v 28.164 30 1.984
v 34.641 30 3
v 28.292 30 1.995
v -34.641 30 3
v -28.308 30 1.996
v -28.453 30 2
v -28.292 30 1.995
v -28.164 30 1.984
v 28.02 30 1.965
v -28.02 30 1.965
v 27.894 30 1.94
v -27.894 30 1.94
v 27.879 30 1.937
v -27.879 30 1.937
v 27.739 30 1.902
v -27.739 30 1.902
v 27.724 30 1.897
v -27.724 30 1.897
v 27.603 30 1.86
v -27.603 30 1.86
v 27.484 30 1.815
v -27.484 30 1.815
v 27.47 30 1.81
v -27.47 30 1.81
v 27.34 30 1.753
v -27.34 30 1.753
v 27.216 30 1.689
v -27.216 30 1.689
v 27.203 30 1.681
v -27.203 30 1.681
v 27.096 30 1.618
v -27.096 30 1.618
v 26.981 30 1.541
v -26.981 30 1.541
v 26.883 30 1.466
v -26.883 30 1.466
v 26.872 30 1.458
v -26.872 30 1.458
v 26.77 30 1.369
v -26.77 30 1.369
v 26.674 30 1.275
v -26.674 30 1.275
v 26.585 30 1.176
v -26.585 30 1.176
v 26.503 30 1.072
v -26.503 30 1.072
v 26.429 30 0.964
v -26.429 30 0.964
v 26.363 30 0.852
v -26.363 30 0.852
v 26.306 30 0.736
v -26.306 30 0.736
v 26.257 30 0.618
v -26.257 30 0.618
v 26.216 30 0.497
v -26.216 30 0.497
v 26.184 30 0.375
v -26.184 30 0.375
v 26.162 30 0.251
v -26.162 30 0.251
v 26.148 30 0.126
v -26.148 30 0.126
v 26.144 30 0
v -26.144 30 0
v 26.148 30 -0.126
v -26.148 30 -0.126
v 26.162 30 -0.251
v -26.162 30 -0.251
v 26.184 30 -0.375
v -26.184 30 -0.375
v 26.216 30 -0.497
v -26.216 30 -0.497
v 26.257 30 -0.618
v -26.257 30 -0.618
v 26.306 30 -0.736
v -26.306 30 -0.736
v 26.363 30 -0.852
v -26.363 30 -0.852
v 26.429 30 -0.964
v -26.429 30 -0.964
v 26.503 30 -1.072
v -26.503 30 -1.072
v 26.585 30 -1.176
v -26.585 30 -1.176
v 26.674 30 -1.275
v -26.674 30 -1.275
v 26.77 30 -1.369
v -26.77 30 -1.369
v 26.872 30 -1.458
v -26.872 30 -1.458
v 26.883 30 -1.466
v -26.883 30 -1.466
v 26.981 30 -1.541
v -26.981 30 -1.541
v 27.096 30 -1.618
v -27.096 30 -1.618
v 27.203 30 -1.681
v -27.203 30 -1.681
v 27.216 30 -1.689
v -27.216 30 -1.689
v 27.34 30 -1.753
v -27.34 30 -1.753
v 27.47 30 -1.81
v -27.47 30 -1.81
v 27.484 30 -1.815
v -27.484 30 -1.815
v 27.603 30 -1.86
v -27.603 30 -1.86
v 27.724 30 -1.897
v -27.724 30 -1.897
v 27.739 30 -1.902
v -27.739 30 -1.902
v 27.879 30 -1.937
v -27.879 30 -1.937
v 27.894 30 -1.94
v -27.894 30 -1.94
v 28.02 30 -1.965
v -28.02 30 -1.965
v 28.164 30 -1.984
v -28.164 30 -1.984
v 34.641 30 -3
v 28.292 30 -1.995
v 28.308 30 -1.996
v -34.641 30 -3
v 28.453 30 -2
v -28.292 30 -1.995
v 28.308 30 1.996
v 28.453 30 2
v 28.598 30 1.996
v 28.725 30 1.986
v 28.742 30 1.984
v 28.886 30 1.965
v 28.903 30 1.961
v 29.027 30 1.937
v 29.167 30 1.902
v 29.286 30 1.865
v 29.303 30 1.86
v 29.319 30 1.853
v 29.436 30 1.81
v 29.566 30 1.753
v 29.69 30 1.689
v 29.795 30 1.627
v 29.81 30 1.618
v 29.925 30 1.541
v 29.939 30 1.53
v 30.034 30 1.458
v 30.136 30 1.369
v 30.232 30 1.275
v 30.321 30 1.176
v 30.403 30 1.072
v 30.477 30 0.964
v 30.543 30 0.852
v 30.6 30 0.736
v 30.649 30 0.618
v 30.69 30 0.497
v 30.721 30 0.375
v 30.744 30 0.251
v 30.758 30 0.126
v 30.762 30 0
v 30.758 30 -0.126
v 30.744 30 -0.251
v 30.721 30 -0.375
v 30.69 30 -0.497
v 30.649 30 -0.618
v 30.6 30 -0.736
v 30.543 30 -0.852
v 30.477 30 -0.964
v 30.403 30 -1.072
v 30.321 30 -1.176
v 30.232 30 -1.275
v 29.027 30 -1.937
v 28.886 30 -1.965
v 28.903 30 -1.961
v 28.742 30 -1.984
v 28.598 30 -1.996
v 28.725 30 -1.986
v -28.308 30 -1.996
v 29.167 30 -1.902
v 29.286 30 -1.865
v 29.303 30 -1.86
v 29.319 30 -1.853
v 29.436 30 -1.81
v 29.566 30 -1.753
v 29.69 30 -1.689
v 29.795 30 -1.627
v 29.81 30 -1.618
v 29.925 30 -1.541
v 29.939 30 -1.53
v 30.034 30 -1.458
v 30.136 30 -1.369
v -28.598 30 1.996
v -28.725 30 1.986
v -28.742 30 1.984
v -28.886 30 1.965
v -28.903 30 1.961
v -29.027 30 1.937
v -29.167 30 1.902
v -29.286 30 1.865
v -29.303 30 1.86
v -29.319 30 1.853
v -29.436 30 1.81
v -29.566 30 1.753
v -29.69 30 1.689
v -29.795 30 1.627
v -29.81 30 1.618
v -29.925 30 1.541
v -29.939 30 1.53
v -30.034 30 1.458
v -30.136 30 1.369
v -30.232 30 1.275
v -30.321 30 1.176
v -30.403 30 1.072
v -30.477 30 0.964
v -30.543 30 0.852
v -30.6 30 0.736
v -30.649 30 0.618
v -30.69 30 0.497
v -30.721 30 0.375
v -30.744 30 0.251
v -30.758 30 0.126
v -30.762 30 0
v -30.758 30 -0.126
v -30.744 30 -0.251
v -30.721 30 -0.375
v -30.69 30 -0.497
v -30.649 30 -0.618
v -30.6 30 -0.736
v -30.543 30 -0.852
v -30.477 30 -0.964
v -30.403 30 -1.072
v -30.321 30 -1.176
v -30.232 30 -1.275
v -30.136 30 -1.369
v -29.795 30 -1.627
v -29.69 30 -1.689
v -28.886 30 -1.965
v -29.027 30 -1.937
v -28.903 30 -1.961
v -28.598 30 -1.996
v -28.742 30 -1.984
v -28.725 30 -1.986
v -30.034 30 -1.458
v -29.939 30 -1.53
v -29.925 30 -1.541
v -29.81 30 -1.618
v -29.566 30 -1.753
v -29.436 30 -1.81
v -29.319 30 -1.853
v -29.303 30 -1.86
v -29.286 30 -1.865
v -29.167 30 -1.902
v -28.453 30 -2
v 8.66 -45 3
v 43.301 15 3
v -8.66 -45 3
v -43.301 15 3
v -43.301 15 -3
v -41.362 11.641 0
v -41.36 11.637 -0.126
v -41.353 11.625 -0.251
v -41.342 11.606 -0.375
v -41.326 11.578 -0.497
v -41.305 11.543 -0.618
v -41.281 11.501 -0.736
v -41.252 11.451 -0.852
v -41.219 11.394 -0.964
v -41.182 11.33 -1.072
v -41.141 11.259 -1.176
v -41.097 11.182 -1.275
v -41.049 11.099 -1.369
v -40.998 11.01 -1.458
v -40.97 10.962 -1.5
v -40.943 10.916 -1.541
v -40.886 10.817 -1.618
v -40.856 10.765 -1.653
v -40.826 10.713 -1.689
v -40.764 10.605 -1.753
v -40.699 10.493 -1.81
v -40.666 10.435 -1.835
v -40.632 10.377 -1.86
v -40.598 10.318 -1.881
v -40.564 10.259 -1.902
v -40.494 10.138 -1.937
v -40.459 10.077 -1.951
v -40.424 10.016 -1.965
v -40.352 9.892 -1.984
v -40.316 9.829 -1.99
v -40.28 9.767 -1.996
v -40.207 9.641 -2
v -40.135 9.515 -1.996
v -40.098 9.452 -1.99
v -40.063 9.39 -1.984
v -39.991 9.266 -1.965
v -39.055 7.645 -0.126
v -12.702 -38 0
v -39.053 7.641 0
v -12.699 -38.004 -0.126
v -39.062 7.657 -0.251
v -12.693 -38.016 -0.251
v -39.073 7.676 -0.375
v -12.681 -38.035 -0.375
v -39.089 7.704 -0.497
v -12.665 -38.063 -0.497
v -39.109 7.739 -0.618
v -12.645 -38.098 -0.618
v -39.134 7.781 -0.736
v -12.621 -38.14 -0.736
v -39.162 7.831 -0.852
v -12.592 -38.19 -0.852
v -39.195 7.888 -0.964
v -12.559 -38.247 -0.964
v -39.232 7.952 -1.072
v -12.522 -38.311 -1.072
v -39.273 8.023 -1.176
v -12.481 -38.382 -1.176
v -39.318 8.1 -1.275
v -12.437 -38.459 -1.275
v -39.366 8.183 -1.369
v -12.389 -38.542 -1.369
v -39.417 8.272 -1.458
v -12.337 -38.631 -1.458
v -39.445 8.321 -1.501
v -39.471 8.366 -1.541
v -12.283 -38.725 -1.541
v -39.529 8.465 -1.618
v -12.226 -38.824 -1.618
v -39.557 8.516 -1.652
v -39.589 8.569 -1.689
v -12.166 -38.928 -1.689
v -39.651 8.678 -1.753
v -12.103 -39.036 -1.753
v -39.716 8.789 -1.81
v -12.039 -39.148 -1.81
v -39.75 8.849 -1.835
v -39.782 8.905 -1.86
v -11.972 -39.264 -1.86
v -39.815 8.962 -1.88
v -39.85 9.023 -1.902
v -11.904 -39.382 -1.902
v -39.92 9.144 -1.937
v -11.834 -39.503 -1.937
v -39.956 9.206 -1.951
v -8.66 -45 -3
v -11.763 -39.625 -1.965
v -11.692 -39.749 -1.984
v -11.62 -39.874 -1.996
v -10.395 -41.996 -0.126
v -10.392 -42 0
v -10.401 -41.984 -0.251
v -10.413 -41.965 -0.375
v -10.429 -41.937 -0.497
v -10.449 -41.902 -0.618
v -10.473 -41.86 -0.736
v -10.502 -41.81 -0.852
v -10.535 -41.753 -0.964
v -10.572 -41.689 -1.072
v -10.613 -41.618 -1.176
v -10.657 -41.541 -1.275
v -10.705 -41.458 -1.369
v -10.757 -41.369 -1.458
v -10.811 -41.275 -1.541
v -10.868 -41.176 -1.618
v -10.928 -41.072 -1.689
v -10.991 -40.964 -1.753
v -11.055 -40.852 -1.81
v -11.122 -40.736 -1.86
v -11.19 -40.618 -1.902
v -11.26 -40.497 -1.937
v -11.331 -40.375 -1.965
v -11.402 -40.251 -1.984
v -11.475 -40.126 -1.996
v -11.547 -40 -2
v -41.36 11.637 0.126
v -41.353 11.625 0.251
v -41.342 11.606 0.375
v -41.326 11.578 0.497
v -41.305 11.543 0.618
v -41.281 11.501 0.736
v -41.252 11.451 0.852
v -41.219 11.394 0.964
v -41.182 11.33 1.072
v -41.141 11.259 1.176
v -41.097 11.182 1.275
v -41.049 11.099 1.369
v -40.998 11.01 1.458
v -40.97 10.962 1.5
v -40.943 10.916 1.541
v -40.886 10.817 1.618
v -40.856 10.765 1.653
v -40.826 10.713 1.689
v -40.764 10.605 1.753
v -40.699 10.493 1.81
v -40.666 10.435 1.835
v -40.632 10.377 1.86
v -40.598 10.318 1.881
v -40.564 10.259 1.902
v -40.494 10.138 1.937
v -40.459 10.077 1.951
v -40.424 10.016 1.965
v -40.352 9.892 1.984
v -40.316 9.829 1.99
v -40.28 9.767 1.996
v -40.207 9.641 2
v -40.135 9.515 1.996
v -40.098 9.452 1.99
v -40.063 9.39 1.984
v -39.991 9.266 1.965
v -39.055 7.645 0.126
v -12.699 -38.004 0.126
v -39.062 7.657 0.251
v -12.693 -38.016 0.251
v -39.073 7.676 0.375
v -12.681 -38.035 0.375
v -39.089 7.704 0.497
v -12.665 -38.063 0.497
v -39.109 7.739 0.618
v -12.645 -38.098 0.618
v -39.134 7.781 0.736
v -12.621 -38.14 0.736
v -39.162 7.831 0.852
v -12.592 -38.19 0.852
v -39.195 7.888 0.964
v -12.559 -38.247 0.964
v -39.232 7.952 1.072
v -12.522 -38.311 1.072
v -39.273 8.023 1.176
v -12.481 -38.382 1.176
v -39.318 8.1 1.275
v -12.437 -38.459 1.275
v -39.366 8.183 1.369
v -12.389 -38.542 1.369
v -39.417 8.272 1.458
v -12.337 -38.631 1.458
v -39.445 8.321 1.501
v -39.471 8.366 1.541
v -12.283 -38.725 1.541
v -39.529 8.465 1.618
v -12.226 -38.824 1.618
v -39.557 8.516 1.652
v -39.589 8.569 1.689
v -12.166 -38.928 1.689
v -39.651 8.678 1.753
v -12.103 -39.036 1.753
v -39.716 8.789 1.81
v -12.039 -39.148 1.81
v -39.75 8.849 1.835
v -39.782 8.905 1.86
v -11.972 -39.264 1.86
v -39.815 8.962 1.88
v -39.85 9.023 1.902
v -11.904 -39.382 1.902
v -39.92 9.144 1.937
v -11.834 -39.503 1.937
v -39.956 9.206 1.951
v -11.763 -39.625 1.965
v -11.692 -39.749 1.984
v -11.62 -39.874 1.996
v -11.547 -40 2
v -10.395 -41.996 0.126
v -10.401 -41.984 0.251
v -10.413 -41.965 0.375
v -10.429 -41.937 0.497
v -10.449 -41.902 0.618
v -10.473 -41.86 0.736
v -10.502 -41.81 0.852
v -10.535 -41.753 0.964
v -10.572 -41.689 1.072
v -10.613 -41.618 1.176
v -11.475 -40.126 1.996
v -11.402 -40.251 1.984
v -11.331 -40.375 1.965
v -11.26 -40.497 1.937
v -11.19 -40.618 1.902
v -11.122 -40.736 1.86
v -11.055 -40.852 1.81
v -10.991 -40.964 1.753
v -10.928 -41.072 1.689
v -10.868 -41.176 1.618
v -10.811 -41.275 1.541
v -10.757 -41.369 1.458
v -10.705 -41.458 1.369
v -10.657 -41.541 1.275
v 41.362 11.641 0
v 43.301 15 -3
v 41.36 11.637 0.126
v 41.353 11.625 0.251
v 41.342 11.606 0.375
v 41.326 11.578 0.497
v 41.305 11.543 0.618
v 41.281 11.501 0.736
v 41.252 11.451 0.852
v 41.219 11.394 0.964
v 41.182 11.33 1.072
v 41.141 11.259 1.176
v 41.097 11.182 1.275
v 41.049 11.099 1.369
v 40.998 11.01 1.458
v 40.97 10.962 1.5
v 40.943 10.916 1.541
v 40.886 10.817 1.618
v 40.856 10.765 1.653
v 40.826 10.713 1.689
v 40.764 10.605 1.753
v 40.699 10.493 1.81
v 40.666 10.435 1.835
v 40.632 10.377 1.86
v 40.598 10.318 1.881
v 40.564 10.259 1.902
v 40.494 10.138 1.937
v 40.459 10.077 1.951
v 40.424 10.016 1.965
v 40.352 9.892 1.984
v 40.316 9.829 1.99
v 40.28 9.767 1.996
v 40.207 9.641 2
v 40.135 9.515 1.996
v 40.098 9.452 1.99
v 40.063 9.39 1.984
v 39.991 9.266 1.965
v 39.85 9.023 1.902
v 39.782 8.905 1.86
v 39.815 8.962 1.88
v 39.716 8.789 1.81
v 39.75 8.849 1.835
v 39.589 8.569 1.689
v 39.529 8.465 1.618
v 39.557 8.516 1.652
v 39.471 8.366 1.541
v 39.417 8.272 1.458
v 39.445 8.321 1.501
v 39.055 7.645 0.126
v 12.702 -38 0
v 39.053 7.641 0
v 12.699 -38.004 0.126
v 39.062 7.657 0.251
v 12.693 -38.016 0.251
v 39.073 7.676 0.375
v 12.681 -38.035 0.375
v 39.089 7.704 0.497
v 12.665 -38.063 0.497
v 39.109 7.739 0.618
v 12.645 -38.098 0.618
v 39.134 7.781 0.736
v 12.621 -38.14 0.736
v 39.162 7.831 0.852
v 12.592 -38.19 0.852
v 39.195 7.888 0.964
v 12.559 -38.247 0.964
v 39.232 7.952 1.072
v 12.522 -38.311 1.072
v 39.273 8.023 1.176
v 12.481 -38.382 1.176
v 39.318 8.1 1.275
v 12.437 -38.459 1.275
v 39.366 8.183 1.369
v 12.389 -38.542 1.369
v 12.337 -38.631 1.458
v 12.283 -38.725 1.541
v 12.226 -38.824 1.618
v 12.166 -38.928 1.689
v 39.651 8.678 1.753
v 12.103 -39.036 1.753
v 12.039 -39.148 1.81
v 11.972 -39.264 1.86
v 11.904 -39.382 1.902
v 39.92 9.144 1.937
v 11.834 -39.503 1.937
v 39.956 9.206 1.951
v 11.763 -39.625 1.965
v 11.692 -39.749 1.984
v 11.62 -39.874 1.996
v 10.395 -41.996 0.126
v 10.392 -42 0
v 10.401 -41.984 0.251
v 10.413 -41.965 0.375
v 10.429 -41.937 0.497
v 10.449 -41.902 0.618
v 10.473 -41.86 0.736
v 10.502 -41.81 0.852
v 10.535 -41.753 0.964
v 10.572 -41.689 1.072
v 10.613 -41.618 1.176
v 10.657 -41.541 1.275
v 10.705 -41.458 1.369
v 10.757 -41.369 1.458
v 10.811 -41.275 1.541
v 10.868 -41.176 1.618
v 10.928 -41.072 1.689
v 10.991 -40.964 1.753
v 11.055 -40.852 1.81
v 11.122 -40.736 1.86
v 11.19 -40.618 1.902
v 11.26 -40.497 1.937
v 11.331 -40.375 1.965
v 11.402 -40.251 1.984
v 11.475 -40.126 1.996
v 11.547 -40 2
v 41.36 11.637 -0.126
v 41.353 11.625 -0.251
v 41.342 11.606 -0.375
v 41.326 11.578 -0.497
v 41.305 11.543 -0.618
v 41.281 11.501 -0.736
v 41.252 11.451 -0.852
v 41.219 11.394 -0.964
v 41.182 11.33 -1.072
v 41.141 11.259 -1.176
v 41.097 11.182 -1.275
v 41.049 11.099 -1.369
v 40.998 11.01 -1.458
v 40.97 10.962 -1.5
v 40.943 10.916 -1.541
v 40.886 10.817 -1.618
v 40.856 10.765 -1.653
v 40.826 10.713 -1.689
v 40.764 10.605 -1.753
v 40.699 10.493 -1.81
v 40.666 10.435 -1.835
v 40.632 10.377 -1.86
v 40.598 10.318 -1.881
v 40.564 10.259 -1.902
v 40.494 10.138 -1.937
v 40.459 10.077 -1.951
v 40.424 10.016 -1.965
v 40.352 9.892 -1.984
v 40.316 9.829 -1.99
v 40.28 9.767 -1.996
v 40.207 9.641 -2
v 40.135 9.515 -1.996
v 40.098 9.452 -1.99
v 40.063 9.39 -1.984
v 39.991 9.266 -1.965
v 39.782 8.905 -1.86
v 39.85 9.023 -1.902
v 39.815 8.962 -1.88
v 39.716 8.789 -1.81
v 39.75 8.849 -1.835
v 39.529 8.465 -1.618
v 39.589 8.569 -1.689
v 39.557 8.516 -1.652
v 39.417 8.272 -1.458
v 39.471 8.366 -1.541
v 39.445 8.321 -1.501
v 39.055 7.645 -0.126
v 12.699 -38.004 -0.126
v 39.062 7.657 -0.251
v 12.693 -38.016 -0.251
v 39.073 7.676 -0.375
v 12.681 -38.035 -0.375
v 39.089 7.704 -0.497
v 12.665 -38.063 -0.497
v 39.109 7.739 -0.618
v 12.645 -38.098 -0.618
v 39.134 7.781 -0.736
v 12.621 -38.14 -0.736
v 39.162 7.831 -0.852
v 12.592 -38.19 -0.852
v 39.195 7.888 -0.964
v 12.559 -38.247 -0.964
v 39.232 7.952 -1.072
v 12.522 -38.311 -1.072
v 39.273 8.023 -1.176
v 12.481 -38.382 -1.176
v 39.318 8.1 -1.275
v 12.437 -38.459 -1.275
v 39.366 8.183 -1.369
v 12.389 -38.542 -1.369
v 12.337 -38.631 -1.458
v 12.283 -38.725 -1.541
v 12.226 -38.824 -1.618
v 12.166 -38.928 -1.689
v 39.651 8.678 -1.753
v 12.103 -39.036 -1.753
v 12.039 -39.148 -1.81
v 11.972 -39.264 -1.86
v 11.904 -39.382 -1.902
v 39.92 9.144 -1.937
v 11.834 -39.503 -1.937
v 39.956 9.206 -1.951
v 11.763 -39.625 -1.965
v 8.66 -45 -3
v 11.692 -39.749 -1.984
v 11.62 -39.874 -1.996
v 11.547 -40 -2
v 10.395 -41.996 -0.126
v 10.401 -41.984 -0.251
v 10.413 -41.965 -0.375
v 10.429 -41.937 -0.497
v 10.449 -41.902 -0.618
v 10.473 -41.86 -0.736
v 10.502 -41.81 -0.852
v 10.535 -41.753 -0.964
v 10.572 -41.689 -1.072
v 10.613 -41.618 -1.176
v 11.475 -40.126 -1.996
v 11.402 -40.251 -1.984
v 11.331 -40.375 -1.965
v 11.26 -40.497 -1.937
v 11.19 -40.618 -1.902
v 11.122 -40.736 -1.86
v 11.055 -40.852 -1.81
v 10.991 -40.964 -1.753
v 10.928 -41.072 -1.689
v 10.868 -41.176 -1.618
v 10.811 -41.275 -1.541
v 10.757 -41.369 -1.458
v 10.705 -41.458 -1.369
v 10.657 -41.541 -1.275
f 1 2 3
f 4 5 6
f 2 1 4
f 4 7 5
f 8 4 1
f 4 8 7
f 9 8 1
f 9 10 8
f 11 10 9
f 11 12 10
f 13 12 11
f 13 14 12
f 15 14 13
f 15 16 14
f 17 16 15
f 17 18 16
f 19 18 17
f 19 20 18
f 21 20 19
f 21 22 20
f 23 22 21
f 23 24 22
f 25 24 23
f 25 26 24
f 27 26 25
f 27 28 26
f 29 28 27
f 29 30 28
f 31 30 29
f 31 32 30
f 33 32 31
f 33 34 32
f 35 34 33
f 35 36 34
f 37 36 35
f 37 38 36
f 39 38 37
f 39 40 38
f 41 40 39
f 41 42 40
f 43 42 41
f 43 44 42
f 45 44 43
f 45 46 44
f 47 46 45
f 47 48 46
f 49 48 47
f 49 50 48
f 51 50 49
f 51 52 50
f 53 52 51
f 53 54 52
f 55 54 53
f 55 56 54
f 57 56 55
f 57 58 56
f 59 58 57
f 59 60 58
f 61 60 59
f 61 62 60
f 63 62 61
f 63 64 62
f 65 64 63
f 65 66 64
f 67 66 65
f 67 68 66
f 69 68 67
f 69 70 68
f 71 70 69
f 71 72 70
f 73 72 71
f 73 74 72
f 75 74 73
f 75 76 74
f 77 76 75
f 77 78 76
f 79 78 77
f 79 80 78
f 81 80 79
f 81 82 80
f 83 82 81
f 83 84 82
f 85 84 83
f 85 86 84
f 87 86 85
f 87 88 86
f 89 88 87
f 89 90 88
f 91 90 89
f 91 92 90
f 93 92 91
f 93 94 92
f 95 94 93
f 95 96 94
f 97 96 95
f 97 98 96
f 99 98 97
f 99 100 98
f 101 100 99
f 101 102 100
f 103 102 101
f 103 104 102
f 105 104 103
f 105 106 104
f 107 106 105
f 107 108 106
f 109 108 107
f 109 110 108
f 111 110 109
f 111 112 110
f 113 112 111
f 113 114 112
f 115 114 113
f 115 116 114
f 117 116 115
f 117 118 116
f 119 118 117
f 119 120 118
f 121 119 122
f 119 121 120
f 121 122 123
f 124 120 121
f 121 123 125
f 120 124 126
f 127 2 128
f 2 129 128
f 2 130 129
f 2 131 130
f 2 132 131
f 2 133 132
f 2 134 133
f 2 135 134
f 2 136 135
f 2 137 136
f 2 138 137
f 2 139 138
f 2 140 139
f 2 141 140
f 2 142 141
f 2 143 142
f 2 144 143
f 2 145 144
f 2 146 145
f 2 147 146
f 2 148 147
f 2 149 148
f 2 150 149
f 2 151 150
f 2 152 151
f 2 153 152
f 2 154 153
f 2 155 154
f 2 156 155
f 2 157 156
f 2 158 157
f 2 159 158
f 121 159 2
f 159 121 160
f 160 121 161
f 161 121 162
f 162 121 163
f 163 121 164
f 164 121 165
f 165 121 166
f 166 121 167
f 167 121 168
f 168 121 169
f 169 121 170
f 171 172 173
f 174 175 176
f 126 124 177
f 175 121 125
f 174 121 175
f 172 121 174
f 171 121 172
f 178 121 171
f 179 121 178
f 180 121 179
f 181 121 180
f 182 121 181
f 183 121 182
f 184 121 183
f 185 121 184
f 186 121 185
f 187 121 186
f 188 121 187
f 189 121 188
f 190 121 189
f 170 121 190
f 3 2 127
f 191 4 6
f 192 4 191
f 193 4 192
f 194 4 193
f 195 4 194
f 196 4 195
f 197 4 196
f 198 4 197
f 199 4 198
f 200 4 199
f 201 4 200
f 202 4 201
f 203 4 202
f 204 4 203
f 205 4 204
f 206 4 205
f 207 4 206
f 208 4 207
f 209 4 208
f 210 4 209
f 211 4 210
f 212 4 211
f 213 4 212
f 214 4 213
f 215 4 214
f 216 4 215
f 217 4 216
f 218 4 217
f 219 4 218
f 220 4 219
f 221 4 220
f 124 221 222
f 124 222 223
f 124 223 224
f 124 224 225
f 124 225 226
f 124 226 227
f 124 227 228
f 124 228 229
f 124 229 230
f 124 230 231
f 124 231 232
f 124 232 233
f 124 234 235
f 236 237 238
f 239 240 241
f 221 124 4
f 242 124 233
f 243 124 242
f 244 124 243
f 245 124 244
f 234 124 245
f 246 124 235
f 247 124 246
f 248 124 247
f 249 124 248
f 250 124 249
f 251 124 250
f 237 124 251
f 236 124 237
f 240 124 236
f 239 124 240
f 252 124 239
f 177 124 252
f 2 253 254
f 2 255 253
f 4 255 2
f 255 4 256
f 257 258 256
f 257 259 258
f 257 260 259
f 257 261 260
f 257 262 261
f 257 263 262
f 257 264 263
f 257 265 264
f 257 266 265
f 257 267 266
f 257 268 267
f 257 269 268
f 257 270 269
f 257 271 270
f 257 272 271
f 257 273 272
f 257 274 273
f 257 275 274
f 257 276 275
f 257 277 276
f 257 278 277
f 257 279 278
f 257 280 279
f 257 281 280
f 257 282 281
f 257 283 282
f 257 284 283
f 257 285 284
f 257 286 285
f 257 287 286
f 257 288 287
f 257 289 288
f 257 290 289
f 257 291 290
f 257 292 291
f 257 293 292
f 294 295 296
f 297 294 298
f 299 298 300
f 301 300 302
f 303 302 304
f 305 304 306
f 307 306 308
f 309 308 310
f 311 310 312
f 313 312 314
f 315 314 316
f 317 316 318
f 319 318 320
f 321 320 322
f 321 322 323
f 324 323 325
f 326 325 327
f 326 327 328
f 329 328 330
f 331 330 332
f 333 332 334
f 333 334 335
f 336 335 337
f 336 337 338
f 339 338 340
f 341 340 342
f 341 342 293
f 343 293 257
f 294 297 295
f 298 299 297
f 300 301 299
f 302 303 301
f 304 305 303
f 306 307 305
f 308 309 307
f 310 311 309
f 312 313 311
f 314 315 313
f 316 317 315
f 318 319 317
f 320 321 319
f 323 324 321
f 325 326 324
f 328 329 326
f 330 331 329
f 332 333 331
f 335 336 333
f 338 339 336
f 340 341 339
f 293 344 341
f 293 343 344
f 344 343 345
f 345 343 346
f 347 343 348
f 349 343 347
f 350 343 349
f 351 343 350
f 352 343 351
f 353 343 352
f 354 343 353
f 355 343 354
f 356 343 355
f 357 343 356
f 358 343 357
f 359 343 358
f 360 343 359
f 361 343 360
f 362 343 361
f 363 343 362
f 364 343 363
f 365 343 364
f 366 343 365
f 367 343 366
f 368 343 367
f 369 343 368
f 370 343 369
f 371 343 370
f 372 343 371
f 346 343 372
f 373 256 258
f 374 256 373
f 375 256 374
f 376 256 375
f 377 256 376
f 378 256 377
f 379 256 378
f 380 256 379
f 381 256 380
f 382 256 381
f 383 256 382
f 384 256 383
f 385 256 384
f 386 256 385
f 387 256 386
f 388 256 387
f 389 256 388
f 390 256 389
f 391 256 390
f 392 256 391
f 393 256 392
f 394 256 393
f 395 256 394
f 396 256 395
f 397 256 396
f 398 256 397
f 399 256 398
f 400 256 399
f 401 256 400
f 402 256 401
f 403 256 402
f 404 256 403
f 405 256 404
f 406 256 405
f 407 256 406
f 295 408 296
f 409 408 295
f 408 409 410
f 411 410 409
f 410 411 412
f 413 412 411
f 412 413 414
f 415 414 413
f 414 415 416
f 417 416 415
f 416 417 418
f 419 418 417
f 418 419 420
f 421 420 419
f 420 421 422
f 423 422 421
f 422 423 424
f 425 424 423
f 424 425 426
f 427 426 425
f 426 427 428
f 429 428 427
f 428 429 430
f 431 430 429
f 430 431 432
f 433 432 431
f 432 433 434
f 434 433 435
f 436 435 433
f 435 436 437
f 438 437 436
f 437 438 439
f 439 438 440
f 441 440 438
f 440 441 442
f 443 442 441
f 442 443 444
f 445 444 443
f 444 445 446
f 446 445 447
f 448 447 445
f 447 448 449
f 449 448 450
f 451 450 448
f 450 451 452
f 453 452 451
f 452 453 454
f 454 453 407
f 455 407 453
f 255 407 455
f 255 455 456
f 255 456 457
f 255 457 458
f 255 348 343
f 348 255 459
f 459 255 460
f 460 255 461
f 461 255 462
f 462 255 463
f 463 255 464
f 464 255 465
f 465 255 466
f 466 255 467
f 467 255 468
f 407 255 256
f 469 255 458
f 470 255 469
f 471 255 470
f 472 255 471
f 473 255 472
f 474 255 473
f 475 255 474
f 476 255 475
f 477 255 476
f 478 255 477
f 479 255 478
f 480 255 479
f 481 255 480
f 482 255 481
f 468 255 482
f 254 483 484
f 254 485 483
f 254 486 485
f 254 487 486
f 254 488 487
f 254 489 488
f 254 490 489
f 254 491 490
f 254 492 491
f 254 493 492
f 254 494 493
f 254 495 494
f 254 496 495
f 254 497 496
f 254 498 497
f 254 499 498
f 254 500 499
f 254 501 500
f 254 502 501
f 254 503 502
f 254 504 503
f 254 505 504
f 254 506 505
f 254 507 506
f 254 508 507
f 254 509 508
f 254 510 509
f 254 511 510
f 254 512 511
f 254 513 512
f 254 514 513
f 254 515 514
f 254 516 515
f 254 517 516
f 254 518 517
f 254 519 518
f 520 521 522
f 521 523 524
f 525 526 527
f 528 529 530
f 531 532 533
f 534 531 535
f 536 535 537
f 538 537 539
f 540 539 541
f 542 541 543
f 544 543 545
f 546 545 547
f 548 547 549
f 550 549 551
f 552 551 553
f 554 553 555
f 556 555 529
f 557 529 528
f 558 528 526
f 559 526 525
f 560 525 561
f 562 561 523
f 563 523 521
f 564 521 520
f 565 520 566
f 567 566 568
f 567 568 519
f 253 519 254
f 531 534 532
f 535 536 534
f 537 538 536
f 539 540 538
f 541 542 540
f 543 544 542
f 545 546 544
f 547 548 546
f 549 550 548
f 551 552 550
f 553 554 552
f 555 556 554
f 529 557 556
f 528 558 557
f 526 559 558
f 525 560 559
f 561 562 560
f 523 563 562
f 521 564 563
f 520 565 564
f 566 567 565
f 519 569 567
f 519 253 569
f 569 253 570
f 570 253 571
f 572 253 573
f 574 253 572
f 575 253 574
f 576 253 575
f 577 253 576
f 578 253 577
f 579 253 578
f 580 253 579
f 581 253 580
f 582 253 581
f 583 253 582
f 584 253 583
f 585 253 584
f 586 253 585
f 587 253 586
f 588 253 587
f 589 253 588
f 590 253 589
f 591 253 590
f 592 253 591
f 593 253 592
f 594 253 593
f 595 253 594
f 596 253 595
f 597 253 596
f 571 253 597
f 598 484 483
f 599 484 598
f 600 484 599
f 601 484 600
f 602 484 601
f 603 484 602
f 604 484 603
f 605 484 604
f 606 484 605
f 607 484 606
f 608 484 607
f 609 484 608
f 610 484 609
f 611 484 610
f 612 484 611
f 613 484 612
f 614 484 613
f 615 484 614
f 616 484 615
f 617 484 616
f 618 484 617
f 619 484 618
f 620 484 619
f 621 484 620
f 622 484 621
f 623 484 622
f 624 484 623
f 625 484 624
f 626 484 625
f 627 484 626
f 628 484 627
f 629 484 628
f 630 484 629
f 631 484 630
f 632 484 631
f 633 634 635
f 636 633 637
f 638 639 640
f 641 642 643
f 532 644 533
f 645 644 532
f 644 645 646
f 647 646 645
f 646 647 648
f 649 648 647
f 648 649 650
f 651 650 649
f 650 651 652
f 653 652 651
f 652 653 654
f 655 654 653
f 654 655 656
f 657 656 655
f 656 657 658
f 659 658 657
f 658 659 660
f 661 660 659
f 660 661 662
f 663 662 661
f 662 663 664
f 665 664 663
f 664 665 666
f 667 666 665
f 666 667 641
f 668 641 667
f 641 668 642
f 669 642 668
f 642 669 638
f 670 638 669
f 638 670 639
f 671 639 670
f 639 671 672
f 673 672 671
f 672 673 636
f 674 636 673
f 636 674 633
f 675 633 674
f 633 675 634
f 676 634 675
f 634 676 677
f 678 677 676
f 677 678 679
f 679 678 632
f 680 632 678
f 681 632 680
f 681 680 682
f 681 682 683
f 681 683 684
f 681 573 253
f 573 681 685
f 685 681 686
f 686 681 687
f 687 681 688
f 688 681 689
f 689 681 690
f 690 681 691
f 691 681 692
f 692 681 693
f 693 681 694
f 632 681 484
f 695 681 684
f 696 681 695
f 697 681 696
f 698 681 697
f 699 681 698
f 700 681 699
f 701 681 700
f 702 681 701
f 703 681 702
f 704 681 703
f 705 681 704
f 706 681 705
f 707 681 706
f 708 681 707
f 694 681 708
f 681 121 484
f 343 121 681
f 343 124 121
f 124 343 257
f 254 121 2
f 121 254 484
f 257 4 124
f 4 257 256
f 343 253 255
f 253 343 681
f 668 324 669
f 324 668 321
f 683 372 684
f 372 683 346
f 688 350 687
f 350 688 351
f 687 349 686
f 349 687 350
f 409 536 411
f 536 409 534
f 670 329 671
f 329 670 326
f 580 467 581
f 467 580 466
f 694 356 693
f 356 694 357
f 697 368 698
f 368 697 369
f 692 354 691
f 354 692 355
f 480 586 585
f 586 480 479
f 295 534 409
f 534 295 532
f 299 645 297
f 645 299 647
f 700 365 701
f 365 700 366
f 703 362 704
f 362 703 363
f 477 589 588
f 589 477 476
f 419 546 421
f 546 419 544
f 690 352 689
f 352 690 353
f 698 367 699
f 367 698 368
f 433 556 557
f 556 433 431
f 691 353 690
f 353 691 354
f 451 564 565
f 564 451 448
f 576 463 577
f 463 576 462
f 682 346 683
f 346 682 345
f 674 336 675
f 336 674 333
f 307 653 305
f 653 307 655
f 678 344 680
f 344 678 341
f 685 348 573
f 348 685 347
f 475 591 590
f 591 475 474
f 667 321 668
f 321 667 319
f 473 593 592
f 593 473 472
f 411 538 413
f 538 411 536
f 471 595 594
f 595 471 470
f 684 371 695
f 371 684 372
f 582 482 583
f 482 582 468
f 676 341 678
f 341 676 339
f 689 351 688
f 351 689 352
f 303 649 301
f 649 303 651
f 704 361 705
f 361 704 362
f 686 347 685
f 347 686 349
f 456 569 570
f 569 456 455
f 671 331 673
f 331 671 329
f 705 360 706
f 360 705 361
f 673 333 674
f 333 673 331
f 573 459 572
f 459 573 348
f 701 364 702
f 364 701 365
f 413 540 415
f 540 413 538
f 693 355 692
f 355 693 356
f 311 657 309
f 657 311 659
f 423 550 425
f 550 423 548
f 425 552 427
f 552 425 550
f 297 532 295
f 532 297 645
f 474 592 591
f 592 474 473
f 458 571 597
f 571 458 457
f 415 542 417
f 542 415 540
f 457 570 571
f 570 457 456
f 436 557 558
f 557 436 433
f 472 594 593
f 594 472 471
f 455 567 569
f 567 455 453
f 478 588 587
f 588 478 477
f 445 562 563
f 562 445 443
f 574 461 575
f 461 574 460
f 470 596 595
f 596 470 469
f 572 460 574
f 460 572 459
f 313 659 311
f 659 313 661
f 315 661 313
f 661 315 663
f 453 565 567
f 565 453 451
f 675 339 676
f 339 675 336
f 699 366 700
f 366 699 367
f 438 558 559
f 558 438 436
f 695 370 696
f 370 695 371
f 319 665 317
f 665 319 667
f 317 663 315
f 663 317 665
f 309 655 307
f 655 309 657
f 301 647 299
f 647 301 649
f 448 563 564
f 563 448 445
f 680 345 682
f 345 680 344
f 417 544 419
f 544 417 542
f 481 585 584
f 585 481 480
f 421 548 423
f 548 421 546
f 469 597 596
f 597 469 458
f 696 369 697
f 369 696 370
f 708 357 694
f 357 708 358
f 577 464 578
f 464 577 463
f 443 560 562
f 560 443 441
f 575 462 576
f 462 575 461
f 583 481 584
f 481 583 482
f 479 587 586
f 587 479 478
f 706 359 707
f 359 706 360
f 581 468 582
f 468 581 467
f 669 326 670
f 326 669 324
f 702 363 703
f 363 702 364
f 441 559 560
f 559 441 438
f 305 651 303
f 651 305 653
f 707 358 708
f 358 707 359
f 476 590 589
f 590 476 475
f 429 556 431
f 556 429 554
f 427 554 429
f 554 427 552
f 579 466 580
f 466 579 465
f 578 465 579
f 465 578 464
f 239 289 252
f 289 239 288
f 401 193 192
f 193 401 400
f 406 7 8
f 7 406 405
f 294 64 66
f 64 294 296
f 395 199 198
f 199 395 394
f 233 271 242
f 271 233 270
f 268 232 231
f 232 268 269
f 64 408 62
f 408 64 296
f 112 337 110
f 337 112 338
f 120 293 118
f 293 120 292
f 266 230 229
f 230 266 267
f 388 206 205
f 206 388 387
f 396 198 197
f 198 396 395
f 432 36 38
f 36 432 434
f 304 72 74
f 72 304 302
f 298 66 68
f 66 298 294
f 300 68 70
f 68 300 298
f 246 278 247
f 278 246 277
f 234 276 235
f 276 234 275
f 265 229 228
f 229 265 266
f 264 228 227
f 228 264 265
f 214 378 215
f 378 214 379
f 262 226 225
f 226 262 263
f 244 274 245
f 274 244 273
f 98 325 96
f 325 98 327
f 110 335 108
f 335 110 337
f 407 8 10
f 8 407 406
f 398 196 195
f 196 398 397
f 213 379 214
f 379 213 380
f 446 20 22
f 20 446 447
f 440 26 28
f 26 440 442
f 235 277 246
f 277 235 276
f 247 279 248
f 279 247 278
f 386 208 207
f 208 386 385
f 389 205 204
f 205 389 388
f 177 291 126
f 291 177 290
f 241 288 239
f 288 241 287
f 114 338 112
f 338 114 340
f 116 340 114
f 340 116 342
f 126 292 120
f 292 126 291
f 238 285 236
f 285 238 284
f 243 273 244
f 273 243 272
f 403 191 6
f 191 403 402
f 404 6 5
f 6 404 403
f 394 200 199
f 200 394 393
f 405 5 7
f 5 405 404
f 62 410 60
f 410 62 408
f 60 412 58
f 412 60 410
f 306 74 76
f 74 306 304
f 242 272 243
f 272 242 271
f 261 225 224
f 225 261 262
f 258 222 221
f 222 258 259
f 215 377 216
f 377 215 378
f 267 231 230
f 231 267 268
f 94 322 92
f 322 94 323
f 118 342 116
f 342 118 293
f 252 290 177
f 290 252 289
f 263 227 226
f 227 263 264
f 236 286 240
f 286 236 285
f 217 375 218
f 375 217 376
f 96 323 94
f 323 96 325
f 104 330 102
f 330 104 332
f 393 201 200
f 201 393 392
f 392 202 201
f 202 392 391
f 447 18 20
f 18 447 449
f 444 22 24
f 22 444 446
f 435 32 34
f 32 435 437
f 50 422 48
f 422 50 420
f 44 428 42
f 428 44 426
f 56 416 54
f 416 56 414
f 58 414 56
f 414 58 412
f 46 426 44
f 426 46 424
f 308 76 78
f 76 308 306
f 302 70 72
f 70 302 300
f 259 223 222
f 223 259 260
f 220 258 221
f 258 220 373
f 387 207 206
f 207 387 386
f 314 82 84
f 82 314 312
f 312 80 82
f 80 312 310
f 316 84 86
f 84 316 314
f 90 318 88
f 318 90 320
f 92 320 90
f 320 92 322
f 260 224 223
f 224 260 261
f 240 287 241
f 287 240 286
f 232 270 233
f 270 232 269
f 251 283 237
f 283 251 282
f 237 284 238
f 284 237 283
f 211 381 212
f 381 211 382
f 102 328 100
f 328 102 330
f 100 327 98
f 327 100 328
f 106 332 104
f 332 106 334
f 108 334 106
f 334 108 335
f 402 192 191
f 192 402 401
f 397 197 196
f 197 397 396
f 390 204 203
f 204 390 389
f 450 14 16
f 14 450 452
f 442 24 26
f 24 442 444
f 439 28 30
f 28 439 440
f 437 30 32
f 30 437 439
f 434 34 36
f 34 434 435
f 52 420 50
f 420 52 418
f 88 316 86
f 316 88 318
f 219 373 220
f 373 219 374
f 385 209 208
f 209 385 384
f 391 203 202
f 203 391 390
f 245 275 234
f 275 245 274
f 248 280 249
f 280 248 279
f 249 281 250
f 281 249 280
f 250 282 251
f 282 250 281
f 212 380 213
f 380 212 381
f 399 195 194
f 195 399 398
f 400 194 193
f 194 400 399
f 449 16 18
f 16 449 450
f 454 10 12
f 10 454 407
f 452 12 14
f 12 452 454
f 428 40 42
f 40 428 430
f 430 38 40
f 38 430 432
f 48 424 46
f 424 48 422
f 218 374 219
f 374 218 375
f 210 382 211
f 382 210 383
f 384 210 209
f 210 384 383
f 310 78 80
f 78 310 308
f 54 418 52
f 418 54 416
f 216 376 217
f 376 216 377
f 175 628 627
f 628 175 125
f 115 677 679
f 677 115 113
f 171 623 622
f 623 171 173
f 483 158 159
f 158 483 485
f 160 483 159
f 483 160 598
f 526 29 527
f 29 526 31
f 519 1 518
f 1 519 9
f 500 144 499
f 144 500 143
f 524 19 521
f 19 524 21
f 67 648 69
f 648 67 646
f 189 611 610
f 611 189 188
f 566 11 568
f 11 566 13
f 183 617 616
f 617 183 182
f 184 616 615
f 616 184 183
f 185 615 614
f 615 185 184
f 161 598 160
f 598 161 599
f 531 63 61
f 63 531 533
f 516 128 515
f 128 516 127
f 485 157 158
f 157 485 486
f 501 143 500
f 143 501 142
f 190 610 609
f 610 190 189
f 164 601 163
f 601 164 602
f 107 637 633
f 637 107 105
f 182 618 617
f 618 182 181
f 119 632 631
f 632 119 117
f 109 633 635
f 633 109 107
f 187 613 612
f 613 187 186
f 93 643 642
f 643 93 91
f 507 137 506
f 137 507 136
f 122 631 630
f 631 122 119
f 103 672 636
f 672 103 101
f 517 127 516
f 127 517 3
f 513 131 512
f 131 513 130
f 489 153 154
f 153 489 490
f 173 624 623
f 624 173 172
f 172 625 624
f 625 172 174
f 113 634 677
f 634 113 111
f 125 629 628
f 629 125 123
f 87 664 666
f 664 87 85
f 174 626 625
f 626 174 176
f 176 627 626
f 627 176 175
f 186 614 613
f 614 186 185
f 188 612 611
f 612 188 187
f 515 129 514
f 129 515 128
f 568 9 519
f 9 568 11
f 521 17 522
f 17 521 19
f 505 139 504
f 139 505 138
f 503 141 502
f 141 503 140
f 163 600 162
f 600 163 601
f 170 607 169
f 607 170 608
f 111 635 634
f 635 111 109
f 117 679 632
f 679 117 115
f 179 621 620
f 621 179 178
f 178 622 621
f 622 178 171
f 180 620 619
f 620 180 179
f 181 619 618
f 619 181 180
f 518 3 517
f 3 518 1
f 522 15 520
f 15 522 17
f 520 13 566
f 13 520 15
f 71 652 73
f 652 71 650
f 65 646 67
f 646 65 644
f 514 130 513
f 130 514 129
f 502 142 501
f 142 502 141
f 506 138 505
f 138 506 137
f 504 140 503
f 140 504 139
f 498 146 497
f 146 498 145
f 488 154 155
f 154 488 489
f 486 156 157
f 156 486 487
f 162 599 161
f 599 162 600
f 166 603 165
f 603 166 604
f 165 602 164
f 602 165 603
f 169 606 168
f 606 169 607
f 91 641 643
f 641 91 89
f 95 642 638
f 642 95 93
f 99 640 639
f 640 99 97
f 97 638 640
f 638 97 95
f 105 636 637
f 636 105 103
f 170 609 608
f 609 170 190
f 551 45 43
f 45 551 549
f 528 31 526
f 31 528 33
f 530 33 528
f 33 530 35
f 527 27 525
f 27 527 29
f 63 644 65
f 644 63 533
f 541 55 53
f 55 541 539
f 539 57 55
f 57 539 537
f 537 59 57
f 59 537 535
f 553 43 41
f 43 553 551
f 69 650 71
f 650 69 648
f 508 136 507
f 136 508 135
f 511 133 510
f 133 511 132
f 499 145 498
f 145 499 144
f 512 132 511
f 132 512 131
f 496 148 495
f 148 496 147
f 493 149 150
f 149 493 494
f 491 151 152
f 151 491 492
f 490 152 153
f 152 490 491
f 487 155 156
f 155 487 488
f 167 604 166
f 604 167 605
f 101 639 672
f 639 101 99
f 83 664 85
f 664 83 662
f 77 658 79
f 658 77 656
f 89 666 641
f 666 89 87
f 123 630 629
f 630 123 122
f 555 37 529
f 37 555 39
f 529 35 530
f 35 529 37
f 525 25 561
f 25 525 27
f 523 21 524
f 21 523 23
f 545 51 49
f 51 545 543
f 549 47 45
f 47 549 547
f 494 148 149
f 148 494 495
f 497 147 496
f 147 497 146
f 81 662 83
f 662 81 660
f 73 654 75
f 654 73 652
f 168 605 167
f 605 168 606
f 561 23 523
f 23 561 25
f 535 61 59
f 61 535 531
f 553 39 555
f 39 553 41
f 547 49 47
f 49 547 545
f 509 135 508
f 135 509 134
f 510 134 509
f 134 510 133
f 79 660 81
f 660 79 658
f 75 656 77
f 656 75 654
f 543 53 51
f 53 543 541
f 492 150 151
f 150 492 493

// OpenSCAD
// Diameter of circle in which Triangle is inscribed
small_triangle_r = 60;
large_triangle_r = small_triangle_r * 1.5;

// Height of the Triangle
triangle_height = 6;    

hole_r = 2;
hole_length = 60;

difference() {
    intersection() {
        rotate(30)
            cylinder(r=small_triangle_r, h=triangle_height, center=true, $fn=3);
        rotate(90)
            cylinder(r=large_triangle_r, h=triangle_height, center=true, $fn=3);
    }
    
    translate([0, -40, 0]) 
        rotate([0, 90, 0])
            cylinder(r=hole_r, h=hole_length, center=true, $fn=100);

    translate([-40, 10, 0]) 
        rotate([0, 90, 60])
            cylinder(r=hole_r, h=hole_length, center=true, $fn=100);

    translate([40, 10, 0]) 
        rotate([0, 90, -60])
            cylinder(r=hole_r, h=hole_length, center=true, $fn=100);
}
